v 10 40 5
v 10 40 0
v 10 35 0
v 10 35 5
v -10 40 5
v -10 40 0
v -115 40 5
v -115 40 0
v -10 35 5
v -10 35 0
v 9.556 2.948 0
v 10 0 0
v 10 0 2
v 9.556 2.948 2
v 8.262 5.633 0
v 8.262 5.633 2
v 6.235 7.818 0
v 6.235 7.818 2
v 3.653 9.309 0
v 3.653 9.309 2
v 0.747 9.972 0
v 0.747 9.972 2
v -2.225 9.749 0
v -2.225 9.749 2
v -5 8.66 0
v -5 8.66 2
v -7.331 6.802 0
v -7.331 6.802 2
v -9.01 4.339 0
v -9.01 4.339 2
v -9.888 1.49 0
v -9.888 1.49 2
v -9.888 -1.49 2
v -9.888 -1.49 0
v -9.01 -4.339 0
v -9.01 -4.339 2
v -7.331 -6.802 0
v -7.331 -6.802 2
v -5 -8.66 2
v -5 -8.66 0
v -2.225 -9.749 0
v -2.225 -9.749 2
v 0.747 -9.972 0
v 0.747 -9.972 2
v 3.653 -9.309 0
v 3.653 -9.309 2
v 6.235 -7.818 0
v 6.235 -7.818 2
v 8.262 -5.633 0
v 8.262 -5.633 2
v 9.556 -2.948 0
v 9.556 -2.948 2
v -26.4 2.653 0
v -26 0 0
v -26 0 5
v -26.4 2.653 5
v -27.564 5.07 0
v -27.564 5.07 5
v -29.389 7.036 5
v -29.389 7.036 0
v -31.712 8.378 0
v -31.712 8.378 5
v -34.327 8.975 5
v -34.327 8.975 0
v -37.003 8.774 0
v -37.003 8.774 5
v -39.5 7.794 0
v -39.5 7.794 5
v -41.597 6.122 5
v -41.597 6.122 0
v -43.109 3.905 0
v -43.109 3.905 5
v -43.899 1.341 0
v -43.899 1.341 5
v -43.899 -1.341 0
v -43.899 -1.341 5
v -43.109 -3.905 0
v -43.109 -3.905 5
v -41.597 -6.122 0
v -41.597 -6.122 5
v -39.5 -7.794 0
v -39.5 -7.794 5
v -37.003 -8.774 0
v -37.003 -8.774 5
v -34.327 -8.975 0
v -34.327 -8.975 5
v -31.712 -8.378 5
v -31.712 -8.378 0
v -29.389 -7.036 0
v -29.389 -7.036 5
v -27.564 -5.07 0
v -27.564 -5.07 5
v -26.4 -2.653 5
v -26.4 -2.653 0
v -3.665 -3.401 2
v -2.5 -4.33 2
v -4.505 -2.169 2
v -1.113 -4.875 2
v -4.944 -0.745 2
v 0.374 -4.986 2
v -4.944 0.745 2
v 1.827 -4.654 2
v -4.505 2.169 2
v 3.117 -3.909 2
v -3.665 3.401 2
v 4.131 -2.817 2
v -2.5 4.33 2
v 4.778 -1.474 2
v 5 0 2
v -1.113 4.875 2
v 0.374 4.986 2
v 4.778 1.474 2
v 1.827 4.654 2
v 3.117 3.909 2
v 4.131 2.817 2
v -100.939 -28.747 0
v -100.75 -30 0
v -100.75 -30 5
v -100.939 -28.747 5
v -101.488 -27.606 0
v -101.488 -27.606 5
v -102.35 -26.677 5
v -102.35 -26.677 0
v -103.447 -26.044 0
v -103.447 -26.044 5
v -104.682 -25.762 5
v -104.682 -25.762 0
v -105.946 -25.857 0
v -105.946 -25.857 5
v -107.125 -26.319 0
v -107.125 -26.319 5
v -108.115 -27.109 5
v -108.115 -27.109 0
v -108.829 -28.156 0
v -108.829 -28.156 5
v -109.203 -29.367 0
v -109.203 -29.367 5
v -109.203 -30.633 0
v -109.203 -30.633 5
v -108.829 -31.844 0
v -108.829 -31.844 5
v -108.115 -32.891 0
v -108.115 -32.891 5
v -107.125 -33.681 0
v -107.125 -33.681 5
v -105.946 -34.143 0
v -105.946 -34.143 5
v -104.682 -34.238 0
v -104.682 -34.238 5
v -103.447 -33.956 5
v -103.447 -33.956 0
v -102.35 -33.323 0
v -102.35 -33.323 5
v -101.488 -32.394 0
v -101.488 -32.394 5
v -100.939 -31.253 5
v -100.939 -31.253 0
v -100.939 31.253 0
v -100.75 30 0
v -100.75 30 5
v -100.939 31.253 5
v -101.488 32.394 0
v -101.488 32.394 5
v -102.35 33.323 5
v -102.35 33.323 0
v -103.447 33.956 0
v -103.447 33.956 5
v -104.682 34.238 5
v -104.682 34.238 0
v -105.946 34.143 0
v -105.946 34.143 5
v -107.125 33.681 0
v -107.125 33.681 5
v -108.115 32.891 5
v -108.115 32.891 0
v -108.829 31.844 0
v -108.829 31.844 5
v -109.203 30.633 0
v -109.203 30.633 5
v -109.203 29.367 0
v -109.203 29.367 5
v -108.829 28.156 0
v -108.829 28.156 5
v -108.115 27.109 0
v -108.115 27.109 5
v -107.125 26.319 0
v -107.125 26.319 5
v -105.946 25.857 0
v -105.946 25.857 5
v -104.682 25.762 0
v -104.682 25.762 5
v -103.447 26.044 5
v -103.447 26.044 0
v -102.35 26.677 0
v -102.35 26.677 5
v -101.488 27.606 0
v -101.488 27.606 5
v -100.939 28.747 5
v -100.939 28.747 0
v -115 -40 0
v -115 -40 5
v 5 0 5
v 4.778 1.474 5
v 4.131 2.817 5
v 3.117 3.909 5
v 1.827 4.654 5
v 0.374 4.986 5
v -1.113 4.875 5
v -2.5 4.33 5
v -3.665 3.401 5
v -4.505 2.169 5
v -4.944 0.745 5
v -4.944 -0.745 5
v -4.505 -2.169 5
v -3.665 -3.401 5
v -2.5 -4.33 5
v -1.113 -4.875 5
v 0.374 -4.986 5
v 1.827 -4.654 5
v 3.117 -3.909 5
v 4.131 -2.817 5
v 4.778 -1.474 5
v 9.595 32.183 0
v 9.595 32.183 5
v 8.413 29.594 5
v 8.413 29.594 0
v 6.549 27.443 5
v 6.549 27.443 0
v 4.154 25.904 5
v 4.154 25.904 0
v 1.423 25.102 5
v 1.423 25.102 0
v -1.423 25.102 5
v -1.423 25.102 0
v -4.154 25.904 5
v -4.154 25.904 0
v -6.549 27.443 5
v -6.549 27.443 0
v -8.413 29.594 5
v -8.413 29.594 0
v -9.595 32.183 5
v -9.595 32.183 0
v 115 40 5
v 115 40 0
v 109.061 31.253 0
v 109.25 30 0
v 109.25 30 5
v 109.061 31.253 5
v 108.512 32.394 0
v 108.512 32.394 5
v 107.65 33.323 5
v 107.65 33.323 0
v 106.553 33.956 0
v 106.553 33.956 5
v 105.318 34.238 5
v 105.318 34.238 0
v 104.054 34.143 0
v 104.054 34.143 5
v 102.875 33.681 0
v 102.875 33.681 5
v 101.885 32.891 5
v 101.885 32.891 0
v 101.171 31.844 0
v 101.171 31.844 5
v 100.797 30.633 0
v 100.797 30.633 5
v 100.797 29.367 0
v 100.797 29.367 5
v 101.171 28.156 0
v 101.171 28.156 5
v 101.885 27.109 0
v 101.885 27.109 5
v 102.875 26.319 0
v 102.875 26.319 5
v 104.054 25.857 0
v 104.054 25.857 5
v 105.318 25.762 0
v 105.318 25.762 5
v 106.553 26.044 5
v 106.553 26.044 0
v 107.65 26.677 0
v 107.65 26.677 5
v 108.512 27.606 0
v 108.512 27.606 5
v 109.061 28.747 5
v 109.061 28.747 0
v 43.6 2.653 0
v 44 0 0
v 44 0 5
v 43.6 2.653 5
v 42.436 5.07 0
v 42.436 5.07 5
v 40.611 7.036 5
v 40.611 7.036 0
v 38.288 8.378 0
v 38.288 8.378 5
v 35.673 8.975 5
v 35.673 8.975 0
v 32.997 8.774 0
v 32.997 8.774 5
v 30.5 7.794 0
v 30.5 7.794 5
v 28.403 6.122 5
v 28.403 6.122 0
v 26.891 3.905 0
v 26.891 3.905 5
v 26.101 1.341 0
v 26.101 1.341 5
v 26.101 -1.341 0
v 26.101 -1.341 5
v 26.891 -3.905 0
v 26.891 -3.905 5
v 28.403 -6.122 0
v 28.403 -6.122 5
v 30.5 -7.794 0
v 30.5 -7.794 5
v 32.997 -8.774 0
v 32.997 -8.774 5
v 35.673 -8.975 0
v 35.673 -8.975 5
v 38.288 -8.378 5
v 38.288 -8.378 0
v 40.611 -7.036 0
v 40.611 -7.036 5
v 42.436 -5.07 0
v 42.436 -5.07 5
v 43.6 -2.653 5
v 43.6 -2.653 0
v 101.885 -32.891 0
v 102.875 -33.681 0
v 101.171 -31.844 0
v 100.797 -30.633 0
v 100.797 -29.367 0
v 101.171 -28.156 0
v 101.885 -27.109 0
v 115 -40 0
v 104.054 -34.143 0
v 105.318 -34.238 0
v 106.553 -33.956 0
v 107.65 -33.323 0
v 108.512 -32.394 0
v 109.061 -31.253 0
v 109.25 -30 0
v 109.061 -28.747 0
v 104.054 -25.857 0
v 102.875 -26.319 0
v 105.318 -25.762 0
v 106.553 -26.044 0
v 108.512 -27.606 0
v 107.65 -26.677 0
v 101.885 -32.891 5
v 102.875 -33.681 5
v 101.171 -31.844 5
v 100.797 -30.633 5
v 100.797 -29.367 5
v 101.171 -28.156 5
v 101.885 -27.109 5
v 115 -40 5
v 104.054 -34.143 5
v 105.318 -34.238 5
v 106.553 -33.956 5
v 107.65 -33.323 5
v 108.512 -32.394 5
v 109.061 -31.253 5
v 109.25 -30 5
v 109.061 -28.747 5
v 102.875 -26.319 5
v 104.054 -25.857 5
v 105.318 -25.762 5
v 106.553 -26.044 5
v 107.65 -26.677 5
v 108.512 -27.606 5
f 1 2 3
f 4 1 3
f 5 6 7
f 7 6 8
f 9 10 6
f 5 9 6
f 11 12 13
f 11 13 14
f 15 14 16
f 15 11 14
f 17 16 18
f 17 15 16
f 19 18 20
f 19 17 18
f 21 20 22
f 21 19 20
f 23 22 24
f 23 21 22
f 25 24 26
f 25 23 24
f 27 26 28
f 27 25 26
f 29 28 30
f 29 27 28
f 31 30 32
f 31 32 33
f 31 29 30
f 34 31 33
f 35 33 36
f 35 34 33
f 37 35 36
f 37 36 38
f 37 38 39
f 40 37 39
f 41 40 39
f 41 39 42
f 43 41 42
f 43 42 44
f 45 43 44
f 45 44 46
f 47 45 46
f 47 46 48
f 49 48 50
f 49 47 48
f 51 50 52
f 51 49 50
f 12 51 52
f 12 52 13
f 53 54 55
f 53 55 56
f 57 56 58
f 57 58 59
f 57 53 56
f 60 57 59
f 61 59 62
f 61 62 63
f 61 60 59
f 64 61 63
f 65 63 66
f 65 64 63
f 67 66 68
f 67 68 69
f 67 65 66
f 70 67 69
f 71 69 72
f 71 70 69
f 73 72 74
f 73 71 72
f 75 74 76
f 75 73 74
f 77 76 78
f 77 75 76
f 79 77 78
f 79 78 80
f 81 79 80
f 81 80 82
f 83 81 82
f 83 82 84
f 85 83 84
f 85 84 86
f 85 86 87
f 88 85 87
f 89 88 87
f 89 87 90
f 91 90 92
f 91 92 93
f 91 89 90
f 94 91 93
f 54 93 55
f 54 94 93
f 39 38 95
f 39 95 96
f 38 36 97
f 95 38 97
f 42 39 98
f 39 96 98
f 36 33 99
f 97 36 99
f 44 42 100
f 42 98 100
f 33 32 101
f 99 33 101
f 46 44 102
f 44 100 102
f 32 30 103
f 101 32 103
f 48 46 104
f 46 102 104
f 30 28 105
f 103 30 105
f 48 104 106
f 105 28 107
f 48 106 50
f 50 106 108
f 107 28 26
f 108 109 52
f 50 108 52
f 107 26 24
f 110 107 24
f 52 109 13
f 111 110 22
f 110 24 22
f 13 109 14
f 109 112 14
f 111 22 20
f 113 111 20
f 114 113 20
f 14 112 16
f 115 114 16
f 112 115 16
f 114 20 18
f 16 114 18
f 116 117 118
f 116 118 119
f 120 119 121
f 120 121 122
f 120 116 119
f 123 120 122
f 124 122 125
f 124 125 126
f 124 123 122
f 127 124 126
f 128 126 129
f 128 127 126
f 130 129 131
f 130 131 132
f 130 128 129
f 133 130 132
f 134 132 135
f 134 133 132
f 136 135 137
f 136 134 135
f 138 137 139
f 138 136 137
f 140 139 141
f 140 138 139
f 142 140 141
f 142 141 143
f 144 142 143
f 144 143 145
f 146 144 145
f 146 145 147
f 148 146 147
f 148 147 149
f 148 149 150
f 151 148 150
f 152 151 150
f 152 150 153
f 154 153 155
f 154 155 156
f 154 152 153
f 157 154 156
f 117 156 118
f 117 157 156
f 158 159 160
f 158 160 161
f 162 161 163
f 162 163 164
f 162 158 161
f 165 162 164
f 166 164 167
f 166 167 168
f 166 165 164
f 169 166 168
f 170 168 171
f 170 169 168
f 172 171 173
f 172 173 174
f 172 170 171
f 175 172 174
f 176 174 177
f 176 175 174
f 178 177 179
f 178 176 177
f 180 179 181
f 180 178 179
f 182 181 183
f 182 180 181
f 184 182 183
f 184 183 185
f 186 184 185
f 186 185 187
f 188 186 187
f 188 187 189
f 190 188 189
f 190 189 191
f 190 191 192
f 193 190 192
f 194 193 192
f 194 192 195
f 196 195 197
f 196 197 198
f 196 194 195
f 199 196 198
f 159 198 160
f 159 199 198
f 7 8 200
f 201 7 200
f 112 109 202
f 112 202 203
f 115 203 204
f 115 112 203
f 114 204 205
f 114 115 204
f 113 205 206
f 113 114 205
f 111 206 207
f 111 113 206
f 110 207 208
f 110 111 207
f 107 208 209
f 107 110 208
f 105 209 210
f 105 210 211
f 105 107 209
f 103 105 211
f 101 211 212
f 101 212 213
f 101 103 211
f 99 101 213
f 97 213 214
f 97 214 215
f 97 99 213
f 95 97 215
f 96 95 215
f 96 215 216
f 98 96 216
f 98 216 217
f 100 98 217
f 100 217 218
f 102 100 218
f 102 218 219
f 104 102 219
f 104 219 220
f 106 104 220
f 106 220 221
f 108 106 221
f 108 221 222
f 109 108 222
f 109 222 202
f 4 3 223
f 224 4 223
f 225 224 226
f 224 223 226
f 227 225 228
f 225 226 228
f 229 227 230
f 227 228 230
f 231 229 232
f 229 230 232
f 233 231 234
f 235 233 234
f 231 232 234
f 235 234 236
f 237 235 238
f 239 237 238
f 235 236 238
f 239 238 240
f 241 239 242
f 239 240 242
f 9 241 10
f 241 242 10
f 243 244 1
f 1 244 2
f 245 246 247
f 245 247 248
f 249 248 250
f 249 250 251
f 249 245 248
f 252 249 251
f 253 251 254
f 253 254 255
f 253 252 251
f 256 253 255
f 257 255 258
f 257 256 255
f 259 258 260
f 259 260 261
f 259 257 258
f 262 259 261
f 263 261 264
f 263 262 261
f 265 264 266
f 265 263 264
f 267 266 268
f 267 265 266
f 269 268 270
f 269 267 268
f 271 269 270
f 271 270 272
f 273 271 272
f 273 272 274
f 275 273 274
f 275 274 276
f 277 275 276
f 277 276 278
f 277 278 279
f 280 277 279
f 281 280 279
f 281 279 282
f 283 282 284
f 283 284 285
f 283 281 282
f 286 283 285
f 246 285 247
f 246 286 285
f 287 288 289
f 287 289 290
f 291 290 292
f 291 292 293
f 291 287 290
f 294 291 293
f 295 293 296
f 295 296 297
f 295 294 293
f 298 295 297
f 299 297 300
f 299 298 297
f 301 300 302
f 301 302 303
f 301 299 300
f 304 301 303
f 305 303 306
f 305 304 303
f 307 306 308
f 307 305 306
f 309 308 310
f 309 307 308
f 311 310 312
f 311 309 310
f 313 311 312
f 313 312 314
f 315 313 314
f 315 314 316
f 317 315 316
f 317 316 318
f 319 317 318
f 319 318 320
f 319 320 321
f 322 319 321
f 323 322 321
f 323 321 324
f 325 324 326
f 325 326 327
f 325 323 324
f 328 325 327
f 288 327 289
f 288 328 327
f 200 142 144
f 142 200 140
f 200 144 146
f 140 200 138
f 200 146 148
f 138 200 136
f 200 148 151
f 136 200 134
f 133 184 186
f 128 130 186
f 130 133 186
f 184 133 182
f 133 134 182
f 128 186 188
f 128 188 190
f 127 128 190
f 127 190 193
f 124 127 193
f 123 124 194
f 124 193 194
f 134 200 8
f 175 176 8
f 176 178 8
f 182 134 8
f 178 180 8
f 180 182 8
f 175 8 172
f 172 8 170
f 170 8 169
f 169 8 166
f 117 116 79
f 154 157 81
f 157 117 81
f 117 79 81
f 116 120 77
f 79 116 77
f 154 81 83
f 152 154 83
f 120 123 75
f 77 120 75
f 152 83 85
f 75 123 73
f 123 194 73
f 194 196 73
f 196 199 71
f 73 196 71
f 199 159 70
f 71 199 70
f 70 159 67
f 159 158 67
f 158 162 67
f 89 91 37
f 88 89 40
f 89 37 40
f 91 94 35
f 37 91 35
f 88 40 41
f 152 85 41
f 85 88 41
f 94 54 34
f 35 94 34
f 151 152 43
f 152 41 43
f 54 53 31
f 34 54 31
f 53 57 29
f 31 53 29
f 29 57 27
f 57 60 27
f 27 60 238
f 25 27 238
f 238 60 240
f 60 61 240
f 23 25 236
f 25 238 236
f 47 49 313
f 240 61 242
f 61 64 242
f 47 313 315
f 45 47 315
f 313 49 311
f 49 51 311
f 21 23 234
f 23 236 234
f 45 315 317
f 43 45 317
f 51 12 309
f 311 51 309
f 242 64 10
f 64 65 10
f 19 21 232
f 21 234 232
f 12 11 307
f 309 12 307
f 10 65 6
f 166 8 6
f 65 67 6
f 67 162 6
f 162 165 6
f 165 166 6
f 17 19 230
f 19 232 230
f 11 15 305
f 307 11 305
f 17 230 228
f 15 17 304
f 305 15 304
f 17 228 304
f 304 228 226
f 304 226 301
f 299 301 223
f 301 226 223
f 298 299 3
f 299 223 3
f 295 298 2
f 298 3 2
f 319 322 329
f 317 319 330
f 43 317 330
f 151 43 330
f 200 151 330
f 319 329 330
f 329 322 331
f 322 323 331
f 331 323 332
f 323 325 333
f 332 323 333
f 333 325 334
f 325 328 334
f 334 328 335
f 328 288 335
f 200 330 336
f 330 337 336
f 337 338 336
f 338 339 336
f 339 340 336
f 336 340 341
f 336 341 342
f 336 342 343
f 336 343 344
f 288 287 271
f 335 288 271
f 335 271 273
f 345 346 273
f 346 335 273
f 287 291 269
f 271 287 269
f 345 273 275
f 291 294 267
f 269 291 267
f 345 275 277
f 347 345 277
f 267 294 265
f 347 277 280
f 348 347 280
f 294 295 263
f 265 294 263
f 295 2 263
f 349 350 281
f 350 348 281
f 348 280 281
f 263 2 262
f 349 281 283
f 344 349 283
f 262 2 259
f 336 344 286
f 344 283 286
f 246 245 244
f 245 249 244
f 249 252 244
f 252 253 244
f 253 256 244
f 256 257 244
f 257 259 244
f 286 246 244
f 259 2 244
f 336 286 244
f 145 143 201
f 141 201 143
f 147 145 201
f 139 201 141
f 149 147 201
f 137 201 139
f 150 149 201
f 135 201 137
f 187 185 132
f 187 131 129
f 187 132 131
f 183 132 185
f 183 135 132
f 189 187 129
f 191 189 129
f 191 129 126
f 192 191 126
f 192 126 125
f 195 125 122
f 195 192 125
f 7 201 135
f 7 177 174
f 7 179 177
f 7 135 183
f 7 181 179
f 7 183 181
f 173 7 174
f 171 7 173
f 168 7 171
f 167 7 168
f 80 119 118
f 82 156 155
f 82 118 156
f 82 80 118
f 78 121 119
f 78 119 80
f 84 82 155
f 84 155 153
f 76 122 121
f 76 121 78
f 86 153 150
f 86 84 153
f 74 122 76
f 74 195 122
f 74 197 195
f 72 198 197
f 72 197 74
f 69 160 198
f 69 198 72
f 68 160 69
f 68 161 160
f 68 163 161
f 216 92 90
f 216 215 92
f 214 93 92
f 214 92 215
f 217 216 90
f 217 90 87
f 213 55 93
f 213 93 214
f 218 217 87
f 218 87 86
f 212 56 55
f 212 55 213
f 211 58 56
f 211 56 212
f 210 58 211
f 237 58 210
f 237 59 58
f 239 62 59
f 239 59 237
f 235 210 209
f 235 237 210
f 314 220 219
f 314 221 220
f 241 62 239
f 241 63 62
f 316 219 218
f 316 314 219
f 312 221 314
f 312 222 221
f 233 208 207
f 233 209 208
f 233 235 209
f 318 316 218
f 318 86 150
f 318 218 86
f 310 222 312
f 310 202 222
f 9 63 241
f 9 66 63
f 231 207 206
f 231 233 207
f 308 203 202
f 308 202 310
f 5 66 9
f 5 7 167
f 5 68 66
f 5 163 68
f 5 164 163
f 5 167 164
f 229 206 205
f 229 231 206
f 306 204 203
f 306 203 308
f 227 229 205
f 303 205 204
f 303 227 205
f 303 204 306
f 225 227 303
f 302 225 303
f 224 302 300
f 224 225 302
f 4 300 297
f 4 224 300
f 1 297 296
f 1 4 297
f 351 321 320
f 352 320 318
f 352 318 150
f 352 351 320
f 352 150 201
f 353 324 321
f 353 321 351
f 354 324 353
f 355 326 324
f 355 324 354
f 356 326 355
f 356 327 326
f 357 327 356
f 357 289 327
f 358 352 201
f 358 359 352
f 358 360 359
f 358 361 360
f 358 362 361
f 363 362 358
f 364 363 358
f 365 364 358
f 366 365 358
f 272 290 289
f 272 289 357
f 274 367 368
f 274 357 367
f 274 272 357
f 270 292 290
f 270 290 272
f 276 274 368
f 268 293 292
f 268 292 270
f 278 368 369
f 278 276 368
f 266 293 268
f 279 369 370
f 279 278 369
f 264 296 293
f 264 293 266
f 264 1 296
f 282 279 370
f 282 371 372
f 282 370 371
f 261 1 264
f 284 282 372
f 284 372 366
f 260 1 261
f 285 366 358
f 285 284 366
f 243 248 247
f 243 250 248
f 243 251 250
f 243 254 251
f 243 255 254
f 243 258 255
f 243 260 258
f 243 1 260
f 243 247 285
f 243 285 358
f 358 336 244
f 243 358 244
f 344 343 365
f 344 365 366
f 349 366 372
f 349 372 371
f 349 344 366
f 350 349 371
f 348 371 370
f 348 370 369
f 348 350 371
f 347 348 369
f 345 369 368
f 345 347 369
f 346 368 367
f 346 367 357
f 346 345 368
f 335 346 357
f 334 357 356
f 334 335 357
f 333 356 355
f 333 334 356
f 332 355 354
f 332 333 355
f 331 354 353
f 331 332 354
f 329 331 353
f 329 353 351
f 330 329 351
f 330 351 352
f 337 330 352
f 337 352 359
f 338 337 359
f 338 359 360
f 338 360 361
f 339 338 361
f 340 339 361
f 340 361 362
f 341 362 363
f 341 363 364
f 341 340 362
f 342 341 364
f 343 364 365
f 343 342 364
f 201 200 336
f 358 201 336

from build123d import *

# Parameters (mm, degrees)
F0_R     = 4.25
F0_R_2   = 9
F0_R_3   = 5
F1_DEPTH = 5
F2_R     = 10
F3_DEPTH = 2


with BuildPart() as f1:
    # F0 (on Top) → F1 (new body)
    with BuildSketch(Plane.XY):
        with BuildLine():
            Line((115, -40), (115, 40))
            Line((115, 40), (10, 40))
            Line((10, 40), (10, 35))
            ThreePointArc((10, 35), (0, 25), (-10, 35))
            Line((-10, 35), (-10, 40))
            Line((-10, 40), (-115, 40))
            Line((-115, 40), (-115, -40))
            Line((-115, -40), (115, -40))
        make_face()
        with Locations((-105, -30)):
            Circle(F0_R, mode=Mode.SUBTRACT)
        with Locations((105, -30)):
            Circle(F0_R, mode=Mode.SUBTRACT)
        with Locations((-35, 0)):
            Circle(F0_R_2, mode=Mode.SUBTRACT)
        with Locations((-105, 30)):
            Circle(F0_R, mode=Mode.SUBTRACT)
        Circle(F0_R_3, mode=Mode.SUBTRACT)
        with Locations((35, 0)):
            Circle(F0_R_2, mode=Mode.SUBTRACT)
        with Locations((105, 30)):
            Circle(F0_R, mode=Mode.SUBTRACT)
    extrude(amount=F1_DEPTH)

    # F2 (on face) → F3 (cut)
    with BuildSketch(Plane.XY):
        Circle(F2_R)
    extrude(amount=F3_DEPTH, mode=Mode.SUBTRACT)


solid = f1.part
